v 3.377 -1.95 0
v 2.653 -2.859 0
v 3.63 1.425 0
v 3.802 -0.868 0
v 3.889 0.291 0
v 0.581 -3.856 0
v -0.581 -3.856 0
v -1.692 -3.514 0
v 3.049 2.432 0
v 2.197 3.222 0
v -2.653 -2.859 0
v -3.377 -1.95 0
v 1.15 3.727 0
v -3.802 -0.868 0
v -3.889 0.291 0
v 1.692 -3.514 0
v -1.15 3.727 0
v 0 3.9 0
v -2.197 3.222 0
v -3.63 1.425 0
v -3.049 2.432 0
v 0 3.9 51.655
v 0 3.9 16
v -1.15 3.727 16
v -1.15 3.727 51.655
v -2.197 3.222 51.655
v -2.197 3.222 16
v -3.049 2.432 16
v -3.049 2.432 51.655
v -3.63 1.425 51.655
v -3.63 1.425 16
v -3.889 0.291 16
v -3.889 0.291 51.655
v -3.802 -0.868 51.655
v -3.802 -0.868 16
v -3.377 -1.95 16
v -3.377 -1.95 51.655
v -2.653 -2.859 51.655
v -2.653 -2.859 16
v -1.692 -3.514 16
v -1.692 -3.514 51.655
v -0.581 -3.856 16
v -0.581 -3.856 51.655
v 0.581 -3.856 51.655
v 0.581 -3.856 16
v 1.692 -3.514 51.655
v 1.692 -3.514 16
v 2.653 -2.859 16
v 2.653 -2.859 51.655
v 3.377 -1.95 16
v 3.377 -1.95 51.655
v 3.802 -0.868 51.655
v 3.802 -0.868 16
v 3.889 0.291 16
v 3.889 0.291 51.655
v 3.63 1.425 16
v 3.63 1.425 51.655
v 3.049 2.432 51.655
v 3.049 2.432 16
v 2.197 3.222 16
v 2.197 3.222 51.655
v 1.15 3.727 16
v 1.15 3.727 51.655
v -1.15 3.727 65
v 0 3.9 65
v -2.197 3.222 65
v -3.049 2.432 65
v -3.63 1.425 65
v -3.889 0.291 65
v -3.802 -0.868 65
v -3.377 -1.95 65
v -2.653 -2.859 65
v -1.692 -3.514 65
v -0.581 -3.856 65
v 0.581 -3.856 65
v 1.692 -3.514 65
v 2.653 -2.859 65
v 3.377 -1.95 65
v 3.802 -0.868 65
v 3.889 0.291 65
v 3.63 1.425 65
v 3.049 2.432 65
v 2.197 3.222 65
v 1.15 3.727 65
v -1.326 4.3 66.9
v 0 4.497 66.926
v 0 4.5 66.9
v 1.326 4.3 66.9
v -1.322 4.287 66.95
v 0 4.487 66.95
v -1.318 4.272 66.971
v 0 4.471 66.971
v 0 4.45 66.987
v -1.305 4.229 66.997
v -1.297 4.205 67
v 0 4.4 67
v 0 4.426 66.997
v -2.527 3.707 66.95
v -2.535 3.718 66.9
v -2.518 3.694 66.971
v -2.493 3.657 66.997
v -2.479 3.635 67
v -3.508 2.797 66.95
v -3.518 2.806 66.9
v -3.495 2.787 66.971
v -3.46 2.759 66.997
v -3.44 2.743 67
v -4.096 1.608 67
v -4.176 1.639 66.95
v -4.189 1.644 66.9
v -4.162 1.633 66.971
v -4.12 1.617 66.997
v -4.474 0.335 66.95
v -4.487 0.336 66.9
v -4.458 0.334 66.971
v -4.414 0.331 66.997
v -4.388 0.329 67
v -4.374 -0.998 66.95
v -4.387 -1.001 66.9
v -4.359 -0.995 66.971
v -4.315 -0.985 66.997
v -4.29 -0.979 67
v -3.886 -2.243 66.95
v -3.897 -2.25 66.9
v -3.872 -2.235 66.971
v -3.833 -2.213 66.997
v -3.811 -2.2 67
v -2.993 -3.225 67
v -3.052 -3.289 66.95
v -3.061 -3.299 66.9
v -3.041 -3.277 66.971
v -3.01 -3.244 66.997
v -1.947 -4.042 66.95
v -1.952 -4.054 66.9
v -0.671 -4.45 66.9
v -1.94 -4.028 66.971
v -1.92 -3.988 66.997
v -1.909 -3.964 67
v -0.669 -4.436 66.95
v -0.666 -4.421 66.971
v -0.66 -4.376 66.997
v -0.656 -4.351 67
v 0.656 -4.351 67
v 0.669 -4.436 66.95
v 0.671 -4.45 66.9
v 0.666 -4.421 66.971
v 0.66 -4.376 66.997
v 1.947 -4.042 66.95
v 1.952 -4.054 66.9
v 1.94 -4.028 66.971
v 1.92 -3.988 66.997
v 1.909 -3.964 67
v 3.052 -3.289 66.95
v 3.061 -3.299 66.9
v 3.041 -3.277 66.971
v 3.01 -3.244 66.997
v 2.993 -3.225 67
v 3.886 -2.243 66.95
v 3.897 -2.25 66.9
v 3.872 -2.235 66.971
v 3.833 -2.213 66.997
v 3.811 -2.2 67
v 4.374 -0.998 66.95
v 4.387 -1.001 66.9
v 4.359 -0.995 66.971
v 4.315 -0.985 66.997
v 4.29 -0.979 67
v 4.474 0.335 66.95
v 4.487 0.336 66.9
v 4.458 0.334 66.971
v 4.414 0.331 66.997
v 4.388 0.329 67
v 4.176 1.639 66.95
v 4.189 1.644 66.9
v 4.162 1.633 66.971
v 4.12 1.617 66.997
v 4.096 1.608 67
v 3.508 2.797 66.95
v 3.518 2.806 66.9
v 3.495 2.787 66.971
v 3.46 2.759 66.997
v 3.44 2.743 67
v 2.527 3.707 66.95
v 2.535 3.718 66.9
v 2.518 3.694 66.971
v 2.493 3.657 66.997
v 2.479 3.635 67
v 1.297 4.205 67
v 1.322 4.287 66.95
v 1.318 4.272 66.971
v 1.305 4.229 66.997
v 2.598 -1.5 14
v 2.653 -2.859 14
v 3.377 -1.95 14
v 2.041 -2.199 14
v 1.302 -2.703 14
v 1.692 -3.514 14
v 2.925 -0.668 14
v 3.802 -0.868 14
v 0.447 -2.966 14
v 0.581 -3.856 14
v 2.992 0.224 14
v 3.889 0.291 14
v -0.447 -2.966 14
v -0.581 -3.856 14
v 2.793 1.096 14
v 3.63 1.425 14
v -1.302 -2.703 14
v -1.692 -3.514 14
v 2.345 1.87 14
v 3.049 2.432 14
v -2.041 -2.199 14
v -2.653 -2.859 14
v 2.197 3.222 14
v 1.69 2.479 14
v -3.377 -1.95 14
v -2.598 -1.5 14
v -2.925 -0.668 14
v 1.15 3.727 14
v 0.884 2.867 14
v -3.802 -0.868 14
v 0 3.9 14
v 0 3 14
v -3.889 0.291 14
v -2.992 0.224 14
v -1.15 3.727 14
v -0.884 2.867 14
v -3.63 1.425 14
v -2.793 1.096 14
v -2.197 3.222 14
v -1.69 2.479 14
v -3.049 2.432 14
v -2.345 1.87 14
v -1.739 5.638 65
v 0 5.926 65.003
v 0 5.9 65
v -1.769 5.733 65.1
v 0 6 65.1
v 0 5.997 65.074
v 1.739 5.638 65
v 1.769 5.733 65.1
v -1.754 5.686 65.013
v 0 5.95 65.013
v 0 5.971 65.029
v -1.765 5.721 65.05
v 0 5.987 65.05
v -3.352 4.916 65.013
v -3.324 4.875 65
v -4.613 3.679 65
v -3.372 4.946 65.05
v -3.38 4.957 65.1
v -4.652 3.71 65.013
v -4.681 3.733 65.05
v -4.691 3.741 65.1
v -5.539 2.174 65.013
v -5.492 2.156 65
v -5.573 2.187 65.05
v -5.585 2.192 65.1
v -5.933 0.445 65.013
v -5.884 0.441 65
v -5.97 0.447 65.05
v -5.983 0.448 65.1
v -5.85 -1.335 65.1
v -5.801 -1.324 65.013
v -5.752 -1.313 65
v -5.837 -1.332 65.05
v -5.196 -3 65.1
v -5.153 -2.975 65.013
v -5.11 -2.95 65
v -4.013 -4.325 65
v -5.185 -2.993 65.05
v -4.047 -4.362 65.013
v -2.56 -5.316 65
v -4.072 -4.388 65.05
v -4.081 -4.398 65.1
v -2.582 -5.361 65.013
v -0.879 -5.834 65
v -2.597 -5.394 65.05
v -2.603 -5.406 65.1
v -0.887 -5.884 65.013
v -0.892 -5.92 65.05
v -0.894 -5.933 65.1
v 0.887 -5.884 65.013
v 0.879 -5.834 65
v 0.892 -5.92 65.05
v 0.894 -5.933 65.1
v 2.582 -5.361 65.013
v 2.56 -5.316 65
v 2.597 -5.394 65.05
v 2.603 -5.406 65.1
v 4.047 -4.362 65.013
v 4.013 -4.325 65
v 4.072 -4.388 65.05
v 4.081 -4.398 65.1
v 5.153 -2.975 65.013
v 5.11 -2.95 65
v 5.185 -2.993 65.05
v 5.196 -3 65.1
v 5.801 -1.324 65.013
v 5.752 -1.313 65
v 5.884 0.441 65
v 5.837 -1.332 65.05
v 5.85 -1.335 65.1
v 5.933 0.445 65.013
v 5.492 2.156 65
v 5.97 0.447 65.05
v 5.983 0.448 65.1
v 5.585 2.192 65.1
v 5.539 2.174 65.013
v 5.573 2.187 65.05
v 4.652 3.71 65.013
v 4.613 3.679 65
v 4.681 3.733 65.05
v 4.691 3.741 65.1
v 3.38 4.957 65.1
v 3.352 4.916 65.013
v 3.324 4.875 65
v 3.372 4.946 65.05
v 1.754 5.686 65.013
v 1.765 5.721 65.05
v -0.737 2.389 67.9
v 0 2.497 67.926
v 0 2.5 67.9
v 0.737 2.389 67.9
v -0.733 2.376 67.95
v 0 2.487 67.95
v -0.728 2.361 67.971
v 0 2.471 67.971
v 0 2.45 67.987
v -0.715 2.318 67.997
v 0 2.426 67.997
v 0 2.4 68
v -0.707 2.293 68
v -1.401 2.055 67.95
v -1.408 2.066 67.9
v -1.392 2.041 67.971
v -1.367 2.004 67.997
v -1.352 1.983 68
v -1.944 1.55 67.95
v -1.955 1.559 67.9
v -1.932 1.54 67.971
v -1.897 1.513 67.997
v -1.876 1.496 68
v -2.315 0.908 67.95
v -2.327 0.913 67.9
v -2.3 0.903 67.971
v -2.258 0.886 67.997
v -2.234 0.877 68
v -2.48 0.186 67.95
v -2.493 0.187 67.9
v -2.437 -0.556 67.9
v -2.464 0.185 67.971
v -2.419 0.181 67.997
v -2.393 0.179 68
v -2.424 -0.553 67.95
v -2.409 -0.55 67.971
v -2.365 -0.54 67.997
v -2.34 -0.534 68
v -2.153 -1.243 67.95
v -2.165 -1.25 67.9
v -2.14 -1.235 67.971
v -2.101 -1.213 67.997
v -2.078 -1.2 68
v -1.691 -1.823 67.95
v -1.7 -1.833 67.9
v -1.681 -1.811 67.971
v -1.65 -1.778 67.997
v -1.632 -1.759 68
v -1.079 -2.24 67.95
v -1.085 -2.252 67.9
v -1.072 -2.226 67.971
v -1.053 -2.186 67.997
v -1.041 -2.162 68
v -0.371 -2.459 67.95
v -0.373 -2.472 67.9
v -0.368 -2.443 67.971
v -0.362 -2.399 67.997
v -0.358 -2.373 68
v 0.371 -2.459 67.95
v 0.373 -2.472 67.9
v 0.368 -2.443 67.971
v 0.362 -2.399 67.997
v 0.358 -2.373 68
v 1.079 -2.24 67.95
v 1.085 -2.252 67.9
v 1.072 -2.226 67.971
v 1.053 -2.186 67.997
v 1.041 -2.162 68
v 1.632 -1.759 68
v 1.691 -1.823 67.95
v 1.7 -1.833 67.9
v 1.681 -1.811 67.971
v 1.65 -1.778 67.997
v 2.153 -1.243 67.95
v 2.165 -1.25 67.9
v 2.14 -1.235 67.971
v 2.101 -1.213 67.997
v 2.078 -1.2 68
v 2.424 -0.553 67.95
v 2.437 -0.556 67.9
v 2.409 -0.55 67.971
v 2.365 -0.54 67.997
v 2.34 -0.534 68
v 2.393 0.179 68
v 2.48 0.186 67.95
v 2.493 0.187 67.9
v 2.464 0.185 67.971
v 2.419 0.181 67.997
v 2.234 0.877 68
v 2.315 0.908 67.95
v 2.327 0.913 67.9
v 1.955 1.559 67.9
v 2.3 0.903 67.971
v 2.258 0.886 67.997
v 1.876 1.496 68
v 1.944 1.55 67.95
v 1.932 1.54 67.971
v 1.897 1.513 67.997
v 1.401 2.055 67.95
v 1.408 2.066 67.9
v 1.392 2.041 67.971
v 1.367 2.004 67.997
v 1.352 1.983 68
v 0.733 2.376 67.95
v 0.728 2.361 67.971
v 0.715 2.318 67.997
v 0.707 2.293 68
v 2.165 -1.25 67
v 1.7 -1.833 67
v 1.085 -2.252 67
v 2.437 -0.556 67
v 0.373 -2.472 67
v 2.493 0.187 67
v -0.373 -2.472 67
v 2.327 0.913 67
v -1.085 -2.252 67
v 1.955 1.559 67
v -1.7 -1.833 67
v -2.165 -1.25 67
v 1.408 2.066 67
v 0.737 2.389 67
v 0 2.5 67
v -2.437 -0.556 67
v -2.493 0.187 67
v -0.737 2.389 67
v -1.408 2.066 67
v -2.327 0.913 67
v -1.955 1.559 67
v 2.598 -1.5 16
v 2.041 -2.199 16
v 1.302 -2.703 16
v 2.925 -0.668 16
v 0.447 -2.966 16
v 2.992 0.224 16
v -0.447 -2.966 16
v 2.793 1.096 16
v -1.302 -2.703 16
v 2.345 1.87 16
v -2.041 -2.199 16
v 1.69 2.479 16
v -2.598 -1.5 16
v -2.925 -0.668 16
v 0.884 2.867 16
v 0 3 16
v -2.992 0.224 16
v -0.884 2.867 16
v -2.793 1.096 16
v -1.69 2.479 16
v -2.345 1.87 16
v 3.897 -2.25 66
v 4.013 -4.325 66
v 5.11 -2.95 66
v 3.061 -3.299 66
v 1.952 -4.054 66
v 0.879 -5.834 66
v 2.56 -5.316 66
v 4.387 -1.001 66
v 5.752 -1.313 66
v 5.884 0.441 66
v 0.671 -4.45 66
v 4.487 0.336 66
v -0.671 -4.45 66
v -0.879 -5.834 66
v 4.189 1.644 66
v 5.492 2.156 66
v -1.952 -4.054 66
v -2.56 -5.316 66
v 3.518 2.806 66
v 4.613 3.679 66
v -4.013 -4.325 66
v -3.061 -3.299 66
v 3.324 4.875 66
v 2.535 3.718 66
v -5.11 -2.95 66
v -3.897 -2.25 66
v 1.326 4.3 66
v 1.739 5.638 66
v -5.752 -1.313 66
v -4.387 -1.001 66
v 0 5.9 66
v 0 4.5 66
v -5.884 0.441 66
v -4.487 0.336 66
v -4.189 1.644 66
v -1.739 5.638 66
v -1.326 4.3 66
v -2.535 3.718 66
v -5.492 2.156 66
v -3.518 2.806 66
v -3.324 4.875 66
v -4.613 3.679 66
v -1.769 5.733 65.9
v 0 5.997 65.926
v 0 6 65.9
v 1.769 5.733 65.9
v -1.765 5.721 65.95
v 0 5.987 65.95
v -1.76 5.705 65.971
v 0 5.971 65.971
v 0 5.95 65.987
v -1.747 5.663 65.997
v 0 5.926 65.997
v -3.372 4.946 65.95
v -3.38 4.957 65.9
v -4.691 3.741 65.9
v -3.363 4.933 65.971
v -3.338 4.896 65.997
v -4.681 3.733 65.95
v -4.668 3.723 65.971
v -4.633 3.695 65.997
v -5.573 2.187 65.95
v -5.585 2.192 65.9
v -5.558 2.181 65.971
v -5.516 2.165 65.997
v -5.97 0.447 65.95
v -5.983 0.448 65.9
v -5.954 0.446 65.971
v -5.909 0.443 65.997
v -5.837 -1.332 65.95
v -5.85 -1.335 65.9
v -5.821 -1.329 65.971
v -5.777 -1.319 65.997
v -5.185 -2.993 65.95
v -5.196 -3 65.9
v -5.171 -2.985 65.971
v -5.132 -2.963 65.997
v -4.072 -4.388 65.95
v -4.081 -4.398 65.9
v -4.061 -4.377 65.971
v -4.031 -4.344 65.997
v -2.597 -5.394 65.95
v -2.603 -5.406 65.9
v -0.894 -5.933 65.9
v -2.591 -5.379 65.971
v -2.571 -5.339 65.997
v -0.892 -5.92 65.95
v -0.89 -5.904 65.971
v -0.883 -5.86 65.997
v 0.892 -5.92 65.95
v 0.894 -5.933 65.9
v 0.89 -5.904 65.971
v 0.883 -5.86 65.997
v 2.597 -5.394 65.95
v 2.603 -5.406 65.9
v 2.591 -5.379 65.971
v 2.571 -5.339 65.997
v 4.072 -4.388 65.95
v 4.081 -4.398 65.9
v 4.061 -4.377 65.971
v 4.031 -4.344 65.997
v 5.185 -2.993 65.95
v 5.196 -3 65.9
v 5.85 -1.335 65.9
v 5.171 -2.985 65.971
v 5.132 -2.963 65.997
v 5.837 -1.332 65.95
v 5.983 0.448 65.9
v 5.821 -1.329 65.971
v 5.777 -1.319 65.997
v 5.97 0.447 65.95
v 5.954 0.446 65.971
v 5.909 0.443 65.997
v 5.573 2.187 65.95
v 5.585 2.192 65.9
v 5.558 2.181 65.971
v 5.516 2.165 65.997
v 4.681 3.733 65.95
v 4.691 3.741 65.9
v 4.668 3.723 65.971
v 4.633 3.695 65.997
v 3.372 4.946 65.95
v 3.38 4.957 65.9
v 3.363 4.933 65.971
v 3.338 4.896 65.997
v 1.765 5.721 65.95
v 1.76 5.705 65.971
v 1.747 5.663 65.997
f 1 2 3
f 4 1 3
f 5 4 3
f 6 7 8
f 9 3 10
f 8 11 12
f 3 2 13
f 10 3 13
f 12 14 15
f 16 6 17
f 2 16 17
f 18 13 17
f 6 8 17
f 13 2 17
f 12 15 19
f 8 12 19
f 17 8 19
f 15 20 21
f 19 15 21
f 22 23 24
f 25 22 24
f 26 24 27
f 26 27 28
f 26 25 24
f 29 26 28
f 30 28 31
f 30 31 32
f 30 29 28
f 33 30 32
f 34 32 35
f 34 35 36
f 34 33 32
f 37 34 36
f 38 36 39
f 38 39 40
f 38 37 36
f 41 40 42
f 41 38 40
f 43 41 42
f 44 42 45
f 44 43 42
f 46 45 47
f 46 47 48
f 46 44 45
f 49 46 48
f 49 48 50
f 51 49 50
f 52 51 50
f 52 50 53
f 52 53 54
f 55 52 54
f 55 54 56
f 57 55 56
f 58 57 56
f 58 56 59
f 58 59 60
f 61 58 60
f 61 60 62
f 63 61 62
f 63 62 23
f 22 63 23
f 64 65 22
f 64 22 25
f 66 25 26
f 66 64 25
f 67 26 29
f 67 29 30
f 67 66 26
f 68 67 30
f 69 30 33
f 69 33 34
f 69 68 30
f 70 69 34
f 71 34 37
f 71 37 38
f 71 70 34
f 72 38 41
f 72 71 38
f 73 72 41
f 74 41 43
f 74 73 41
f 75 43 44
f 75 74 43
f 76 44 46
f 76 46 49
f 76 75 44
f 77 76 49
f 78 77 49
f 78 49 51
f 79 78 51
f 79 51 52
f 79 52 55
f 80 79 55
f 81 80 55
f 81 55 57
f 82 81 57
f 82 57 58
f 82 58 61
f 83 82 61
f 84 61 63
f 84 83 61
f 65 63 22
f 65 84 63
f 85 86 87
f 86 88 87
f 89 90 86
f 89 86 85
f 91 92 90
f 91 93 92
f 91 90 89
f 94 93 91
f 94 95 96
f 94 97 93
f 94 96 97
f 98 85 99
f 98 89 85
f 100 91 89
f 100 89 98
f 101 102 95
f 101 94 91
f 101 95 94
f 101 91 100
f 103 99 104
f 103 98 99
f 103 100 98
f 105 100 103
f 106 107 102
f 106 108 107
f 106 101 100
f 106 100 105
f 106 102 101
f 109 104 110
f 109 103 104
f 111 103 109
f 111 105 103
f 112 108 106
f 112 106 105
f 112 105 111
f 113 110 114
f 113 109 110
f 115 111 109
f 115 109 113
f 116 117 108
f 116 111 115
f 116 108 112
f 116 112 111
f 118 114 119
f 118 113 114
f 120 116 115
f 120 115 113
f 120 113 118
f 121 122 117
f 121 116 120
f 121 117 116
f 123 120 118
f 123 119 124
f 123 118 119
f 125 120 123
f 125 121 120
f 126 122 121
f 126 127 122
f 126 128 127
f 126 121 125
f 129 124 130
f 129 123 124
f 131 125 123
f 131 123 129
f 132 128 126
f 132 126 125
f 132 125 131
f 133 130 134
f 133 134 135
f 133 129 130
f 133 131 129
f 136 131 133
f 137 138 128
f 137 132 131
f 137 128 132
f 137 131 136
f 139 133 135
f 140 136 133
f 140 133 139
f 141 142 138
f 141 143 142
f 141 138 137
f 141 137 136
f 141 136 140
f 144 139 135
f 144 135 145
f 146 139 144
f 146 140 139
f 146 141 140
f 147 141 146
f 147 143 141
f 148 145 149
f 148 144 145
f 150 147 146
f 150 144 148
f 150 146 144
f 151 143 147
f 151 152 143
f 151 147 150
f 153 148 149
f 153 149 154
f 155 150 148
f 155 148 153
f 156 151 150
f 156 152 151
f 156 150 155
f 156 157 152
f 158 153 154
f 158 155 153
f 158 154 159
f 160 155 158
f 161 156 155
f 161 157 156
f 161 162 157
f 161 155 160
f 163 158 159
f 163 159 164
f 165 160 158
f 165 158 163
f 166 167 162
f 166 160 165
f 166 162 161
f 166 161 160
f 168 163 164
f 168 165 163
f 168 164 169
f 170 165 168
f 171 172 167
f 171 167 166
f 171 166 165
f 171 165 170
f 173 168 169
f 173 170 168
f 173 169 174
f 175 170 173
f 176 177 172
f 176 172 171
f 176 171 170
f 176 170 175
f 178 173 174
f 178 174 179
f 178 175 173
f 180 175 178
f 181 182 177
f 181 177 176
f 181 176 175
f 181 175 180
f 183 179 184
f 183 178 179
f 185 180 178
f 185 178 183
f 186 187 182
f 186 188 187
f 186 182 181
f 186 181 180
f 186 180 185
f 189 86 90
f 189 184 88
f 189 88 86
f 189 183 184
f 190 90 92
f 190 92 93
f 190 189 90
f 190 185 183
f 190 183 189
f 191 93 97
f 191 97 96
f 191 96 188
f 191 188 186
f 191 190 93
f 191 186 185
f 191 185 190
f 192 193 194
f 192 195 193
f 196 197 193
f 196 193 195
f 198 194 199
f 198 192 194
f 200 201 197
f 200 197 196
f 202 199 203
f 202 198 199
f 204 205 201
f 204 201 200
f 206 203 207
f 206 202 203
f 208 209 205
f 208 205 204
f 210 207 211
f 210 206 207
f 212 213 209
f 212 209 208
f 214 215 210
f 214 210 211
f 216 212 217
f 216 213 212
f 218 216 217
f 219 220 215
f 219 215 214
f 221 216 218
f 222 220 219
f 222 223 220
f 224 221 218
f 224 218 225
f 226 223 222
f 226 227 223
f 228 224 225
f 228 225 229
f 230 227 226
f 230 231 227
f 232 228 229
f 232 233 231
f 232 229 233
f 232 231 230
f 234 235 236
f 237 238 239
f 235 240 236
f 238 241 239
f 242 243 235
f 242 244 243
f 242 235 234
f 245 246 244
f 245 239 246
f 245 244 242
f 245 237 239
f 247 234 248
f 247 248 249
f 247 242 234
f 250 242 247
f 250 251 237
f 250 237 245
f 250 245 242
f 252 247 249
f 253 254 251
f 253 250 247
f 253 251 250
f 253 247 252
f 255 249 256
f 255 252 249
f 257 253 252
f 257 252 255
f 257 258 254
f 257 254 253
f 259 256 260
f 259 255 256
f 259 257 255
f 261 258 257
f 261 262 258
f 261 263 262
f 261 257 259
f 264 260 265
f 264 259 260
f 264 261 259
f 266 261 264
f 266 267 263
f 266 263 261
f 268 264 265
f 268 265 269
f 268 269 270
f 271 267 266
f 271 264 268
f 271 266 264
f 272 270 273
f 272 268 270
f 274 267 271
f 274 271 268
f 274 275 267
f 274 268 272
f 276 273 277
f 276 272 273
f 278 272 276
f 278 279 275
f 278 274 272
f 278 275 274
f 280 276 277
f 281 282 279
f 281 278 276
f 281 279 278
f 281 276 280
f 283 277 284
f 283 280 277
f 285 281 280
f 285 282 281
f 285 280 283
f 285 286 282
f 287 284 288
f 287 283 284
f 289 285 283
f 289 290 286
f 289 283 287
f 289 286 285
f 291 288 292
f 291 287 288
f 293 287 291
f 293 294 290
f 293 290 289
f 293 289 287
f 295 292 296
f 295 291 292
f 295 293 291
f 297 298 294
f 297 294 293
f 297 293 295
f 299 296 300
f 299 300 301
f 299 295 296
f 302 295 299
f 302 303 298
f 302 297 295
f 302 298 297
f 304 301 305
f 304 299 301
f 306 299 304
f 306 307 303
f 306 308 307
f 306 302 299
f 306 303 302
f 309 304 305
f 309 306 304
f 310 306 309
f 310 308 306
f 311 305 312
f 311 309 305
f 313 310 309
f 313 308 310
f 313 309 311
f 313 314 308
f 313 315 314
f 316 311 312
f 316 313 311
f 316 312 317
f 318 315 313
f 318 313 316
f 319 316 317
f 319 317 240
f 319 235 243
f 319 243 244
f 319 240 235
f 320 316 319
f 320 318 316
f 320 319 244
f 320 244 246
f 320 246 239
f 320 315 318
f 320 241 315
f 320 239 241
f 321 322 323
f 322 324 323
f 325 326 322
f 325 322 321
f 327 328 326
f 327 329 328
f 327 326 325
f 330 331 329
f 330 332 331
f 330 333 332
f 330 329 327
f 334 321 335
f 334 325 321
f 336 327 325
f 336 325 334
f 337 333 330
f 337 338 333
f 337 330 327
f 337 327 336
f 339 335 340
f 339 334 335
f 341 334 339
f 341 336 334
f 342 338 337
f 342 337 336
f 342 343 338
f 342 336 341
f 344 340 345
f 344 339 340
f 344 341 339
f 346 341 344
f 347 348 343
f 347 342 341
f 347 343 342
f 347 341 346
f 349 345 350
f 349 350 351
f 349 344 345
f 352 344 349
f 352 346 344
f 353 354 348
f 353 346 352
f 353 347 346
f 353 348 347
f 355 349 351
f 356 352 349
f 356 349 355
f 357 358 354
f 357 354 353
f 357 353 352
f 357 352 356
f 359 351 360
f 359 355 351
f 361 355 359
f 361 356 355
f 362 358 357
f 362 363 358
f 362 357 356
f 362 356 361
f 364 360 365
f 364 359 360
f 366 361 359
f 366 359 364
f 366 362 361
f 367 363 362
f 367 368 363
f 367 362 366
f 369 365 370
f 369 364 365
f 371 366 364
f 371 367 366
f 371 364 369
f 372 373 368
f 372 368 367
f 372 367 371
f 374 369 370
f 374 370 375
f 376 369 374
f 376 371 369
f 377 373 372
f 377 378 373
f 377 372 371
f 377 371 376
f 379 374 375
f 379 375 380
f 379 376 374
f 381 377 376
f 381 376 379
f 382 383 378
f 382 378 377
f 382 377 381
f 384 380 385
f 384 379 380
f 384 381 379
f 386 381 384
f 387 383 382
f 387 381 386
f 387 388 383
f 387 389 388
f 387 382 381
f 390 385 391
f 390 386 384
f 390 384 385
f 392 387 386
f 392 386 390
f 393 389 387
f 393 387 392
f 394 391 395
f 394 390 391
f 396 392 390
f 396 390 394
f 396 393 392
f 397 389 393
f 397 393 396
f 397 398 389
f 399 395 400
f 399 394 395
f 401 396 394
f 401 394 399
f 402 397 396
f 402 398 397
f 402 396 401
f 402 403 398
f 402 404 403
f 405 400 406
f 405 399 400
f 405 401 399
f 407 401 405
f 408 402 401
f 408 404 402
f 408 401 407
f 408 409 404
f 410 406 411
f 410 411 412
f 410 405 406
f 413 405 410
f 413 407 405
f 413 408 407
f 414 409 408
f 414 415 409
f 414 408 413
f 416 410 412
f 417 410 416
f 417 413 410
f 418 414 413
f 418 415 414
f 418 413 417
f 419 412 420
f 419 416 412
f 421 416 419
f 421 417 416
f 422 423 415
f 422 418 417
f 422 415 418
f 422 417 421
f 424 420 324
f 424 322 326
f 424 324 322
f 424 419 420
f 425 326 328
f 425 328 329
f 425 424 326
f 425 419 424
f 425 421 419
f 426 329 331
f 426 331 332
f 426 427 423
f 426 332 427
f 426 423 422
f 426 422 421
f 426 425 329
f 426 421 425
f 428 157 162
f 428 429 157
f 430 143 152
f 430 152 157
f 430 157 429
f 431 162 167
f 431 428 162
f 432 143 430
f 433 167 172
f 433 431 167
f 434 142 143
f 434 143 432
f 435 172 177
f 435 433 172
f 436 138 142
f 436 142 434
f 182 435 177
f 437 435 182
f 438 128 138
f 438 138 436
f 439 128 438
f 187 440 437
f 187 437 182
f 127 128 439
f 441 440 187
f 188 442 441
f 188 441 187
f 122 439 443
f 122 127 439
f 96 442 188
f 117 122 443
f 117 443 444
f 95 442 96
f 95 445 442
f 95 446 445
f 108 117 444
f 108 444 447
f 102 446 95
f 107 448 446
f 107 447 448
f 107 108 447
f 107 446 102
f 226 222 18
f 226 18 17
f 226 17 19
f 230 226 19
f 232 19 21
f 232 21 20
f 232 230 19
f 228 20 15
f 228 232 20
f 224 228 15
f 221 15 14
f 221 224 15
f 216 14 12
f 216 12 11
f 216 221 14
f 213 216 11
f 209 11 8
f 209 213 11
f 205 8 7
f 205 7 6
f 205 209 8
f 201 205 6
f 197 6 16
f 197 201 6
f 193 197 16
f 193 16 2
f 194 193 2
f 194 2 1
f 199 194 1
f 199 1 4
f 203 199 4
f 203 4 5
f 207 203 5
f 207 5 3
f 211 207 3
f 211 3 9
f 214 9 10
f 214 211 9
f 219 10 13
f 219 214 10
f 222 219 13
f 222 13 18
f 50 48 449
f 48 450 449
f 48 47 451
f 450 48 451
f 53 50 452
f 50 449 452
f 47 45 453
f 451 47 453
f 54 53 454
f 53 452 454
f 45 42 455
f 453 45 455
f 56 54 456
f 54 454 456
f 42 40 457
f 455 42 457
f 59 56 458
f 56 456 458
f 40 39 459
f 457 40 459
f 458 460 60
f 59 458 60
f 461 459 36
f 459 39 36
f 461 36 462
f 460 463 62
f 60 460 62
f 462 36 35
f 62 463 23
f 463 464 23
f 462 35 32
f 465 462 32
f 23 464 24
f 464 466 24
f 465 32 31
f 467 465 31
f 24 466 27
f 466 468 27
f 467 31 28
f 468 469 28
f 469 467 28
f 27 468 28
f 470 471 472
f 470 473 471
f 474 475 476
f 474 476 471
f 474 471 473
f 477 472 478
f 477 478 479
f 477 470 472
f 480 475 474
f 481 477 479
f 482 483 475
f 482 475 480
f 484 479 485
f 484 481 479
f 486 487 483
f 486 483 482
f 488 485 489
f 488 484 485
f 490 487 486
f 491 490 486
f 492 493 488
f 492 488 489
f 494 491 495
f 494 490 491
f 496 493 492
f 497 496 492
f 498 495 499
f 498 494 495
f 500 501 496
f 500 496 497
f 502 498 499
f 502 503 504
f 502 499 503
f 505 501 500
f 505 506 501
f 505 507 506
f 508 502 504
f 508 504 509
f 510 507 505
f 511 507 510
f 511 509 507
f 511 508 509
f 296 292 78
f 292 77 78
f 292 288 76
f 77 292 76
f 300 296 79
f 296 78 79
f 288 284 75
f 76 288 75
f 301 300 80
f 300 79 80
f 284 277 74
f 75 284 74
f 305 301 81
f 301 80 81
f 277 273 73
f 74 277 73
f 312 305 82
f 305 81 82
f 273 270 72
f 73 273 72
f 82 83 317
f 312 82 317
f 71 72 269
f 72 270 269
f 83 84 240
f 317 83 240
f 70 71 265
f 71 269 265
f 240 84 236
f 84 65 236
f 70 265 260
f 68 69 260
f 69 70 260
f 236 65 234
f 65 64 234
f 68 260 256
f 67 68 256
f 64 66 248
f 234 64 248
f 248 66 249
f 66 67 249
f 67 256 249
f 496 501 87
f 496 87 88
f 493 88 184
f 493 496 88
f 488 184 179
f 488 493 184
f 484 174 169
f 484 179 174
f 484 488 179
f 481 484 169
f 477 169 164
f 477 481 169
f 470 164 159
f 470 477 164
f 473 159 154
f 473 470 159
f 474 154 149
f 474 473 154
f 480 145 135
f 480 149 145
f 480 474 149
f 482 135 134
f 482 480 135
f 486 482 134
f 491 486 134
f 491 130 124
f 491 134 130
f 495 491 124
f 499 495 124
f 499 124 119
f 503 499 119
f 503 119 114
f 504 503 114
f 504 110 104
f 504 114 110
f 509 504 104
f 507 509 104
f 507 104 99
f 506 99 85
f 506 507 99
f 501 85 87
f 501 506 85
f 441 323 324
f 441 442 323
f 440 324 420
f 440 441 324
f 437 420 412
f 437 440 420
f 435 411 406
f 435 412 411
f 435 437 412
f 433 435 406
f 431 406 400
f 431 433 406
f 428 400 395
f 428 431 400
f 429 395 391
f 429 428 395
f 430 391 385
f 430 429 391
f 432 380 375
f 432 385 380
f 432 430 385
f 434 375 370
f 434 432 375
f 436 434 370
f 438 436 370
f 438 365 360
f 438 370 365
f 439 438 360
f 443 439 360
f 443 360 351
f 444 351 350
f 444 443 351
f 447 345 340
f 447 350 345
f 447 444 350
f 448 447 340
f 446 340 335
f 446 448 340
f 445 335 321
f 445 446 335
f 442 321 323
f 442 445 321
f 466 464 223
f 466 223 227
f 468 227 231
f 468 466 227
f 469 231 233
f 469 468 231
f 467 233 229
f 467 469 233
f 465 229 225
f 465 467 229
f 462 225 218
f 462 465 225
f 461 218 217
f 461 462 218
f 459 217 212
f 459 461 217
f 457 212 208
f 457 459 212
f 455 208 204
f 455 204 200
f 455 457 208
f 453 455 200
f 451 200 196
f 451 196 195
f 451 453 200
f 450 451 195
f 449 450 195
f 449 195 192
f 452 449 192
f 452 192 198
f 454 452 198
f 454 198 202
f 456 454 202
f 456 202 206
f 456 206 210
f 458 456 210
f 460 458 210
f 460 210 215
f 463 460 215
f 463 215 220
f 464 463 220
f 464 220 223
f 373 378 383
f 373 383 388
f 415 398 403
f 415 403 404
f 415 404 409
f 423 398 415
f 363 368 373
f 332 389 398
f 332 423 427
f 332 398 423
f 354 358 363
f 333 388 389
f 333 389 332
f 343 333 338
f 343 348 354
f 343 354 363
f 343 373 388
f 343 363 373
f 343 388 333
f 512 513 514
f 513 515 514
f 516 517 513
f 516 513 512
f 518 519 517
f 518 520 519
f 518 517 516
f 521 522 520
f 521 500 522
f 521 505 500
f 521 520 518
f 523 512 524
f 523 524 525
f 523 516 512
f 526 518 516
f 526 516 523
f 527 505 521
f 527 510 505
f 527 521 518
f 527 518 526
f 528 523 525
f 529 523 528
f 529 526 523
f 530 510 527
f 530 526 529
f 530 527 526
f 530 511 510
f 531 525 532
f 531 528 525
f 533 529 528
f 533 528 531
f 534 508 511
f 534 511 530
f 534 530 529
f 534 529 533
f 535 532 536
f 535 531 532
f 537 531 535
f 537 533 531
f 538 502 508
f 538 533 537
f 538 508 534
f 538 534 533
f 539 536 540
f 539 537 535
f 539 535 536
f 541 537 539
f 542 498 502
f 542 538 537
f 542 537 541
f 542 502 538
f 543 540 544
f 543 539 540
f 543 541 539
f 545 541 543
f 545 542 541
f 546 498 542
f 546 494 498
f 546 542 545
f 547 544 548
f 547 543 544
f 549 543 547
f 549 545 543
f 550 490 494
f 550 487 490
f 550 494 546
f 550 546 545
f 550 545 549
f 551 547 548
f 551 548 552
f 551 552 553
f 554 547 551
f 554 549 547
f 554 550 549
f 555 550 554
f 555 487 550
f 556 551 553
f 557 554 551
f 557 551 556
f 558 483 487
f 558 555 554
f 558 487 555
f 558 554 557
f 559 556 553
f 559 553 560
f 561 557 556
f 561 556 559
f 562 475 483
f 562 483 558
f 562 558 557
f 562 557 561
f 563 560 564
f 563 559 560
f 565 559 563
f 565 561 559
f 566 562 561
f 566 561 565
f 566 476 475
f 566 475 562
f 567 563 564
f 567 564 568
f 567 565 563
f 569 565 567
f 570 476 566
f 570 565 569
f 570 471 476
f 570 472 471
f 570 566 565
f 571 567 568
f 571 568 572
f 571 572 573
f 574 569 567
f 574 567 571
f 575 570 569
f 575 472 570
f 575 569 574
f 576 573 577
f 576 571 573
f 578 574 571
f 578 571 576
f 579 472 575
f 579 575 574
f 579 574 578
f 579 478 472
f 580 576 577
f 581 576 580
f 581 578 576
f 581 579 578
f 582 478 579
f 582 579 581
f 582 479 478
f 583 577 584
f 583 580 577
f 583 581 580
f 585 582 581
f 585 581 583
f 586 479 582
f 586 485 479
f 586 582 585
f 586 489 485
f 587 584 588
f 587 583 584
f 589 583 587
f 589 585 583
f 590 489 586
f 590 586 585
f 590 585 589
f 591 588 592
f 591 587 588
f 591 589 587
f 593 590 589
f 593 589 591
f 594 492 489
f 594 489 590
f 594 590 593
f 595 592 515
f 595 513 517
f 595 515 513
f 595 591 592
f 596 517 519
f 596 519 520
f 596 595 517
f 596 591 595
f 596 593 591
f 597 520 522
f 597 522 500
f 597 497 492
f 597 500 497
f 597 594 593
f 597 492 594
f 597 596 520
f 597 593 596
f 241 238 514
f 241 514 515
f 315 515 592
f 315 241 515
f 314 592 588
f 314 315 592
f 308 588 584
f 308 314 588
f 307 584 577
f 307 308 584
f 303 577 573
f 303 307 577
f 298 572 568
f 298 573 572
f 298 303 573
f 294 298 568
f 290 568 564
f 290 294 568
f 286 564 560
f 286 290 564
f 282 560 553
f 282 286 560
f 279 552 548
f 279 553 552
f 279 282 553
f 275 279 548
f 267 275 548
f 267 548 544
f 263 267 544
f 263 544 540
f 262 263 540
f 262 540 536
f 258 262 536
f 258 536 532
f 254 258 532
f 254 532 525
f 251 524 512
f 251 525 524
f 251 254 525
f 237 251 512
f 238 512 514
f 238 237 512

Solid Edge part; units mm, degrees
sketch "Sketch1" plane through (0, 0, 0) normal (1, 0, 0) x (0, 1, 0)
  line L0 (0, 0) -> (3.9, 0)
  line L1 (3.9, 0) -> (3.9, 14)
  line L2 (3.9, 14) -> (3, 14)
  line L3 (3, 14) -> (3, 16)
  line L4 (3, 16) -> (3.9, 16)
  line L5 (3.9, 16) -> (3.9, 51.6552)
  line L6 (3.9, 51.6552) -> (3.9, 65)
  line L7 (3.9, 65) -> (6, 65)
  line L8 (6, 66) -> (6, 65)
  line L9 (4.5, 66) -> (6, 66)
  line L10 (4.5, 67) -> (4.5, 66)
  line L11 (2.5, 67) -> (4.5, 67)
  line L12 (2.5, 68) -> (2.5, 67)
  line L13 (0, 68) -> (2.5, 68)
revolve "RevolvedProtrusion1" add sketch "Sketch1" angle 360 about axis through (0, 0, 0) along (0, 0, 1)
fillet "Lekerekítés_1" radius 0.1 2 edges at (-6, 0, 66) (-6, 0, 65)
fillet "Lekerekítés_2" radius 0.1 2 edges at (-4.5, 0, 67) (-2.5, 0, 68)
properties material "Rozsdamentes acél"
